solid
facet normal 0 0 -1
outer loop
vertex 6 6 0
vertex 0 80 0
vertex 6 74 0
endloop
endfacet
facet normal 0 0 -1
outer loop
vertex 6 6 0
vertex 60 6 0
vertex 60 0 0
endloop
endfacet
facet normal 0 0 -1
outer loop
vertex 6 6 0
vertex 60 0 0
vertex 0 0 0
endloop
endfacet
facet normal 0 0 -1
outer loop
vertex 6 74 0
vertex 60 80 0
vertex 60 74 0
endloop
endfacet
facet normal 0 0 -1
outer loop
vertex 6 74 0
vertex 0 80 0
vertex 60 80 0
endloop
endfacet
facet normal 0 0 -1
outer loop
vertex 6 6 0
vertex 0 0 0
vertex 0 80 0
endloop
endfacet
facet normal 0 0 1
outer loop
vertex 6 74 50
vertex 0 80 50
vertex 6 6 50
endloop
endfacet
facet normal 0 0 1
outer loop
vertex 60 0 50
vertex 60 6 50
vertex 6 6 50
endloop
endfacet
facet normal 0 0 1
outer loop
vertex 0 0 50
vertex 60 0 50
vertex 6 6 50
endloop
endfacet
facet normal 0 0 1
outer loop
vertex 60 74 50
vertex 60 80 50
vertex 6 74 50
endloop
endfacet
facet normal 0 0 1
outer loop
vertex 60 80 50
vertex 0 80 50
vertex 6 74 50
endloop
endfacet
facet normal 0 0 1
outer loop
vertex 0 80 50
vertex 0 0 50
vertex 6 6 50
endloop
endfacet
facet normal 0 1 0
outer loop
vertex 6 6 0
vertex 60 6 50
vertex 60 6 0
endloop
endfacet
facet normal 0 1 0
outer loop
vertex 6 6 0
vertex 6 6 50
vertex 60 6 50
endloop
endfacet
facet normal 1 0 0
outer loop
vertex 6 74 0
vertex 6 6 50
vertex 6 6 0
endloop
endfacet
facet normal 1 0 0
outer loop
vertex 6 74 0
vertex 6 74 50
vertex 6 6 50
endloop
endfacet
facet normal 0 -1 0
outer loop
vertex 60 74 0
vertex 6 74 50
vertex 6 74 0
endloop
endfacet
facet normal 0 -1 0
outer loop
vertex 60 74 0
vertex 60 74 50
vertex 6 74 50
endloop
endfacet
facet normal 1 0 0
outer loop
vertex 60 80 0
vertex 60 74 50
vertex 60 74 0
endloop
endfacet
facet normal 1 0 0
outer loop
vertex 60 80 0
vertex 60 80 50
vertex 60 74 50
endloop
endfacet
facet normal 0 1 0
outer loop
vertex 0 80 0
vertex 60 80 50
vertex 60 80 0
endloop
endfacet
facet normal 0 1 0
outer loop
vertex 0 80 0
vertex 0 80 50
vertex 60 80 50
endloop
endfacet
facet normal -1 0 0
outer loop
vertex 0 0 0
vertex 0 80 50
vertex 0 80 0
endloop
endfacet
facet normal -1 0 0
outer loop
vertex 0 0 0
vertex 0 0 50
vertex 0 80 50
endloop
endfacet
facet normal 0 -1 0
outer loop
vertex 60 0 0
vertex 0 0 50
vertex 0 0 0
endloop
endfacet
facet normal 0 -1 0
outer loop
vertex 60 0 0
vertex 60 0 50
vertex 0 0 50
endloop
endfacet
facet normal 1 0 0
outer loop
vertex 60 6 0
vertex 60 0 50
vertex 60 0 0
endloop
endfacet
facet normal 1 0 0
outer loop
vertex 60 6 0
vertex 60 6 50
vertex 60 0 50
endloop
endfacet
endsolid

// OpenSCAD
$fn = 32;

// ----------------------------------------------------------------------
// Structural section: channel 60 x 80 mm
// ----------------------------------------------------------------------

// --- parameters (mm) ---
sec_w = 60;               // channel width, X
sec_h = 80;               // channel height, Y
flange_t = 6;             // flange thickness
web_t = 6;                // web thickness
plate_t = 50;             // cut length, Z (extrusion height)
fit_tol = 0.02;           // declared fit tolerance (prompt contract)
free_tol = 0.2;           // declared free tolerance (prompt contract)

profile = [[0, 0], [60, 0], [60, 6], [6, 6], [6, 74], [60, 74], [60, 80], [0, 80]];  // primary outline, 8 points, counter clockwise

// --- the one profile operation ---
linear_extrude(height = plate_t) polygon(points = profile);
